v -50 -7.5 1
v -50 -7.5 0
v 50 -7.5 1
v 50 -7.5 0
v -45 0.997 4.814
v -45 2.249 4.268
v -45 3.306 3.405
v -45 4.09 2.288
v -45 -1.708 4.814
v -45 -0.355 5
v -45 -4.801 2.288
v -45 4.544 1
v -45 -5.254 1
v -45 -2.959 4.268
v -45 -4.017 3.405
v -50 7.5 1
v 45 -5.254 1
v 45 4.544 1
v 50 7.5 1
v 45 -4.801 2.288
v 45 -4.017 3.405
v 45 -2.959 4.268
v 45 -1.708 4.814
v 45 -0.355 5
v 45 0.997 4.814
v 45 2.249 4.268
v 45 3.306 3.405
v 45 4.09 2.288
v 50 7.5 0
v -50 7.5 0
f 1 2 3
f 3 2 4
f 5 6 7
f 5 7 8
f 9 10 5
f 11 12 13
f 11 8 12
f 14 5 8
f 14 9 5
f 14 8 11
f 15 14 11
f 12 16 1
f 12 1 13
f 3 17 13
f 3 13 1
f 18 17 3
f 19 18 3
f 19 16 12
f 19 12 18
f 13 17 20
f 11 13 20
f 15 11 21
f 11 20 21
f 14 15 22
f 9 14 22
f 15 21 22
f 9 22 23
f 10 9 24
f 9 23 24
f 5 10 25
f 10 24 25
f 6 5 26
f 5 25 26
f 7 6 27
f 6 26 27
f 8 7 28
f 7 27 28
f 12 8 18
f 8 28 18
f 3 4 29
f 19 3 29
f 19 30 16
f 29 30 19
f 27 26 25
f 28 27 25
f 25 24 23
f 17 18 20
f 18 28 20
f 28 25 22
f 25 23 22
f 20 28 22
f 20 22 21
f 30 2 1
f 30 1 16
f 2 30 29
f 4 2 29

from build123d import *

# Parameters (mm, degrees)
F0_W     = 100
F0_H     = 15
F1_DEPTH = 1
F2_W     = 90
F2_H     = 5
F3_ANGLE = 180


with BuildPart() as f1:
    # F0 (on Top) → F1 (new body)
    with BuildSketch(Plane.XY):
        Rectangle(F0_W, F0_H)
    extrude(amount=F1_DEPTH)

    # F2 (on Top) → F3 (revolve)
    with BuildSketch(Plane.XY):
        with Locations((0, -2.855439)):
            Rectangle(F2_W, F2_H)
    revolve(axis=Axis((0, -0.355439, 0), (-1, 0, 0)), revolution_arc=F3_ANGLE)


solid = f1.part
